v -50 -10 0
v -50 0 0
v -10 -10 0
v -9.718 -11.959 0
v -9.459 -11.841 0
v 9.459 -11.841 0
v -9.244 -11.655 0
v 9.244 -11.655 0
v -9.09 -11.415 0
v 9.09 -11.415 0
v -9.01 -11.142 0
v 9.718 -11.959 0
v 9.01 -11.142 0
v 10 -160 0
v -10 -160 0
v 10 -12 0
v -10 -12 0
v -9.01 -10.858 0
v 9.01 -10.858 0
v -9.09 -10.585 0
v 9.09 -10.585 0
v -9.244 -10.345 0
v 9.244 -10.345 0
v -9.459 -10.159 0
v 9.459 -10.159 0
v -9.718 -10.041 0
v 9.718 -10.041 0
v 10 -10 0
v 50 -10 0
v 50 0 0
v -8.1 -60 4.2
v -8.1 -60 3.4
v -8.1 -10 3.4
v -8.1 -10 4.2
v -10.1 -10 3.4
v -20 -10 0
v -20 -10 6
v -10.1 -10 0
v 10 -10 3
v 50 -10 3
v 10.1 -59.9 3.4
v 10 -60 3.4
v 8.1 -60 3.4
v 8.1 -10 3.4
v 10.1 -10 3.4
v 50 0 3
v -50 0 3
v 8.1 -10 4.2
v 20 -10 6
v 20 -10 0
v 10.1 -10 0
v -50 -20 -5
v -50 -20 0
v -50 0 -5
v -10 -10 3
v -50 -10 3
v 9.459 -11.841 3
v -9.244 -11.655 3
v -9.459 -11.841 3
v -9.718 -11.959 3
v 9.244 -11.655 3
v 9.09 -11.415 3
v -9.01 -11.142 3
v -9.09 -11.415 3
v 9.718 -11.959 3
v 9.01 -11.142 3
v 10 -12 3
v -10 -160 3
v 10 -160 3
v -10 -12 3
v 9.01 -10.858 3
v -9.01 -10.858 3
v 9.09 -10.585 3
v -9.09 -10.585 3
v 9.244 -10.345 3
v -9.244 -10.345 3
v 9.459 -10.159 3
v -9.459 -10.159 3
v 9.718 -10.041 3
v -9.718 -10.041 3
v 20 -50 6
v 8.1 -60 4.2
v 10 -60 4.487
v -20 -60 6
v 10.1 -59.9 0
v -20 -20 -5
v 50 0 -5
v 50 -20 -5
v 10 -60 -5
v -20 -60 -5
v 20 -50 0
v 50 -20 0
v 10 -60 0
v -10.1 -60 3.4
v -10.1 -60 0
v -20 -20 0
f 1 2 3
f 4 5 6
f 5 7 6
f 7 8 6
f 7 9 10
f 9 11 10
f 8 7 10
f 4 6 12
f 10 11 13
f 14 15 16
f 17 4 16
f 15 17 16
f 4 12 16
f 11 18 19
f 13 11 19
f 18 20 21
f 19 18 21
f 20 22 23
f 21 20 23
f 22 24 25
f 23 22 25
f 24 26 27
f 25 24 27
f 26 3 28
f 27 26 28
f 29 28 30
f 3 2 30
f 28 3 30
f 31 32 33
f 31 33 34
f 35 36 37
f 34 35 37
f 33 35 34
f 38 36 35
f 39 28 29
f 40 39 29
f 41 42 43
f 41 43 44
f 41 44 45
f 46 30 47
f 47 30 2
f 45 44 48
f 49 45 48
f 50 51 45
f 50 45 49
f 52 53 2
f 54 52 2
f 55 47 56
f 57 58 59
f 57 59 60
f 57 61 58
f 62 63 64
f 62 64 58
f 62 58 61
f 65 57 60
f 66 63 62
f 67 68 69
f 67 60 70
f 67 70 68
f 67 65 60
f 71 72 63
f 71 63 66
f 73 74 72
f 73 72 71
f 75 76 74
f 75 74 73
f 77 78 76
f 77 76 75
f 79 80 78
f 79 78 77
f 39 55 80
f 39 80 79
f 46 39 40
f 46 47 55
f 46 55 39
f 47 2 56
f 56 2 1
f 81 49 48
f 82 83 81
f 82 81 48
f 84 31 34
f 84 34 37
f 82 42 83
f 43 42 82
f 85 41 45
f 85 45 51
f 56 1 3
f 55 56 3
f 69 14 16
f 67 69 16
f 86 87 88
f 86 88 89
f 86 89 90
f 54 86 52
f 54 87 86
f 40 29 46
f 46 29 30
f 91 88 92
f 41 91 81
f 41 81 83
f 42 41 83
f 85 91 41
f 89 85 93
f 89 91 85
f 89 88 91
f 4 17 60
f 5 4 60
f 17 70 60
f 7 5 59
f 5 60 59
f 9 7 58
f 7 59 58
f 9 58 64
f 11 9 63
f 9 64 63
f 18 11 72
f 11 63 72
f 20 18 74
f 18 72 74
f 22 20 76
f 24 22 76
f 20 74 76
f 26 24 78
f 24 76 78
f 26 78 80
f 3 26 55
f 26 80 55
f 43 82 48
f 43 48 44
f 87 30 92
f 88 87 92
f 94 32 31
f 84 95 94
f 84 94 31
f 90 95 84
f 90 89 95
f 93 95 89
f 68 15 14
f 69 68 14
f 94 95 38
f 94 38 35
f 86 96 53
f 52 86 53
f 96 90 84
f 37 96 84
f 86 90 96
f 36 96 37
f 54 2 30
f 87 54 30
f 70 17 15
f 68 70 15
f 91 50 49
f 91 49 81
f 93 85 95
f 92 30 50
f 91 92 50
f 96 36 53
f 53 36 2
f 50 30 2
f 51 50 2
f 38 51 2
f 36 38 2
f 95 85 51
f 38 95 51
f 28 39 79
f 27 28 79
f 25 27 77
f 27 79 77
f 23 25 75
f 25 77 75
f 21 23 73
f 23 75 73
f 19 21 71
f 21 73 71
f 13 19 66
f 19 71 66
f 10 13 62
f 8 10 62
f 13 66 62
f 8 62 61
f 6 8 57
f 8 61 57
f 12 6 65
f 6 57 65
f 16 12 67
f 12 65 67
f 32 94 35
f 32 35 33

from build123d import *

# Parameters (mm, degrees)
PAD003_DEPTH    = 3
SKETCH009_R     = 1
POCKET001_DEPTH = 3
PAD004_DEPTH    = 5
PAD005_DEPTH    = 6
POCKET_DEPTH    = 50


with BuildPart() as teebody:
    # Sketch004 → Pad003 (new body)
    with BuildSketch(Plane.XY):
        Polygon((10, -160), (10, -10), (50, -10), (50, 0), (-50, 0), (-50, -10), (-10, -10), (-10, -160), align=None)
    extrude(amount=PAD003_DEPTH)

    # Sketch009 (on Face10 of Pad003) → Pocket001 (cut)
    with BuildSketch(Plane.XY.offset(3)):
        with Locations((-10, -11)):
            Circle(SKETCH009_R)
        with Locations((10, -11)):
            Circle(SKETCH009_R)
    extrude(amount=-POCKET001_DEPTH, mode=Mode.SUBTRACT)


with BuildPart() as basebody:
    # Sketch006 → Pad004 (new body)
    with BuildSketch(Plane.XY):
        Polygon((-50, 0), (50, 0), (50, -20), (10, -60), (-20, -60), (-20, -20), (-50, -20), align=None)
    extrude(amount=-PAD004_DEPTH)

    # Sketch008 → Pad005 (join)
    with BuildSketch(Plane.XY):
        Polygon((-20, -10), (20, -10), (20, -50), (10, -60), (-20, -60), align=None)
    extrude(amount=PAD005_DEPTH)

    # Sketch (on Face15 of Pad005) → Pocket (cut)
    with BuildSketch(Plane.XZ.offset(60)):
        Polygon((10.1, 3.4), (10.1, 0), (-10.1, 0), (-10.1, 3.4), (-8.1, 3.4), (-8.1, 4.2), (-20, 6), (-20, 8), (20, 8), (20, 6), (8.1, 4.2), (8.1, 3.4), align=None)
    extrude(amount=-POCKET_DEPTH, mode=Mode.SUBTRACT)


solid = Compound([teebody.part, basebody.part])
